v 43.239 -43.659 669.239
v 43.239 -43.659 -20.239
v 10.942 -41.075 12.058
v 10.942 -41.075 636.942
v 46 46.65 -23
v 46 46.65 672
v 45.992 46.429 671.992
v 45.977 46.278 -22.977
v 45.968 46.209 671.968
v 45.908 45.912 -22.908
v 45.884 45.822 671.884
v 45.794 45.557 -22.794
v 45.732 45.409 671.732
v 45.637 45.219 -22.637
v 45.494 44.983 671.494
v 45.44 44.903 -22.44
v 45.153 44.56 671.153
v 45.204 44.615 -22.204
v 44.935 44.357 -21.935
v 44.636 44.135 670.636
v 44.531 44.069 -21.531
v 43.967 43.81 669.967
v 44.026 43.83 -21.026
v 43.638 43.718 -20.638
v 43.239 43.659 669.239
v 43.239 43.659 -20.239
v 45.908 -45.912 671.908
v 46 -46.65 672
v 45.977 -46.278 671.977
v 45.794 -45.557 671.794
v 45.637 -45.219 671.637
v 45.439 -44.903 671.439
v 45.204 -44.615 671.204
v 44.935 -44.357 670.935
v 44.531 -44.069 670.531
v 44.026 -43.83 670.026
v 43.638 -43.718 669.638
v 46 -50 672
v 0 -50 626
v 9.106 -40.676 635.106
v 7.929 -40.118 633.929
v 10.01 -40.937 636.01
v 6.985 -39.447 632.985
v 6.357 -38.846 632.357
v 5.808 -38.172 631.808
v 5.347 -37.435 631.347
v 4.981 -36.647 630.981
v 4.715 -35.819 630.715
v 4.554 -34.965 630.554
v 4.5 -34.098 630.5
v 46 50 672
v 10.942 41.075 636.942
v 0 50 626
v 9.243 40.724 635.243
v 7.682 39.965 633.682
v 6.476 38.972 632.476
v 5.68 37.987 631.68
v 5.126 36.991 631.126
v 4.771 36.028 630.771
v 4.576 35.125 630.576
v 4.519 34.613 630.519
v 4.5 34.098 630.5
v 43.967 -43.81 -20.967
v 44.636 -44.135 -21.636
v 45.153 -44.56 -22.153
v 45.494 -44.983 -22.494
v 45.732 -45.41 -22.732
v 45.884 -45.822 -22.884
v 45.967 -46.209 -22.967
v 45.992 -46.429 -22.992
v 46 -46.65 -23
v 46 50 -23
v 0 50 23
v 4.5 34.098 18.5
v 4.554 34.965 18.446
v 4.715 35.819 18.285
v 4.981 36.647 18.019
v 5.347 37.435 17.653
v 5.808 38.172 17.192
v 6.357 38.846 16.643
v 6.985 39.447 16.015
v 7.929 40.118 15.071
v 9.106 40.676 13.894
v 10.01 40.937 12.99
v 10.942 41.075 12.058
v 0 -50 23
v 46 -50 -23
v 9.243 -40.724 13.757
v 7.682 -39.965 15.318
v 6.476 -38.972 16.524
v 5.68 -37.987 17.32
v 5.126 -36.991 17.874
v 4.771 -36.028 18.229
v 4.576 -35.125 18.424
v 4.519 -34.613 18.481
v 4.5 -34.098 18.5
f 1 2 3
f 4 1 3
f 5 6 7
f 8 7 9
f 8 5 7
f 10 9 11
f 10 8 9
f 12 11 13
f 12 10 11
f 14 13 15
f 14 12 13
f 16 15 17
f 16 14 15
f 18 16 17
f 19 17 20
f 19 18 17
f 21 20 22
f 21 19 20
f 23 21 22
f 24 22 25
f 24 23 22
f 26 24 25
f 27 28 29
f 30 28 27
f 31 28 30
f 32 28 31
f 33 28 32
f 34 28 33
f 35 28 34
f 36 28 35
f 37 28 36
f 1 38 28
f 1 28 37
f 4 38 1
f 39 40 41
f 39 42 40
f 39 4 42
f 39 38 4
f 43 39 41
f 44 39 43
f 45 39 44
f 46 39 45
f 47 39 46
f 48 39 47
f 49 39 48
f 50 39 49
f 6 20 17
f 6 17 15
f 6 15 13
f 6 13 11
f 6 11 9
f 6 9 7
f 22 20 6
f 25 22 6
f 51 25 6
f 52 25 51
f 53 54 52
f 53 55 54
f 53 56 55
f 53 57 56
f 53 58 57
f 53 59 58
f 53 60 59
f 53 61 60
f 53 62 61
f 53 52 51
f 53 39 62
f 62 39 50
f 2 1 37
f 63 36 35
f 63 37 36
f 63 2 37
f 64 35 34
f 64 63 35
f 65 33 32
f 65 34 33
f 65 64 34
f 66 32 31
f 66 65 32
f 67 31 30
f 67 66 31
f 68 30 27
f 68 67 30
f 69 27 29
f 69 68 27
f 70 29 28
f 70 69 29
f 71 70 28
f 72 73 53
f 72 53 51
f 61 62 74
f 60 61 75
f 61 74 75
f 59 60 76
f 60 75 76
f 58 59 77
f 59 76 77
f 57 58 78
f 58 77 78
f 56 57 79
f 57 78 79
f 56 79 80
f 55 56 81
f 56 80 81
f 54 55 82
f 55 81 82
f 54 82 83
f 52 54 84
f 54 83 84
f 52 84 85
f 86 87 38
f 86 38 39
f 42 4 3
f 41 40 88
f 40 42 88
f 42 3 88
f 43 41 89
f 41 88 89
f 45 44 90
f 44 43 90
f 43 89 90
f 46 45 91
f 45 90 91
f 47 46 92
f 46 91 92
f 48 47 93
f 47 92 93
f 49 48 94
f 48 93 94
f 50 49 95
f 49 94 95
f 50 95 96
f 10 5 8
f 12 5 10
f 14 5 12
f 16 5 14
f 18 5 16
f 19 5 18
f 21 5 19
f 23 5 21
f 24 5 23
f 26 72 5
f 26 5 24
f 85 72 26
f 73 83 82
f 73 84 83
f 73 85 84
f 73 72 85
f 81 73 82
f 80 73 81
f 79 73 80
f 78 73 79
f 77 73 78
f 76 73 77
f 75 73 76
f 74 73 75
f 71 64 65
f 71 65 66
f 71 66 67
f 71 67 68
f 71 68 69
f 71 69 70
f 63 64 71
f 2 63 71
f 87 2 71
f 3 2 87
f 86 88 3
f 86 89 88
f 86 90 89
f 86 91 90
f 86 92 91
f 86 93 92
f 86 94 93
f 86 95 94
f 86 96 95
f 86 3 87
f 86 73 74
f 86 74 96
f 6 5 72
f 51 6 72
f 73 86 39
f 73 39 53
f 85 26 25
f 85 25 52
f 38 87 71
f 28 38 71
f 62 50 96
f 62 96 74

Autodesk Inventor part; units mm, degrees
ref_plane "Начальная плоскость" through (0, 0, -23) normal (0, 0, 1) x (1, 0, 0)
ref_plane "Конечная плоскость" through (0, 0, 672) normal (0, 0, 1) x (1, 0, 0)
sketch "Эскиз" plane through (0, 0, 0) normal (0, 0, 1) x (1, 0, 0)
  line L0 (46, -50) -> (0, -50)
  line L1 (46, -50) -> (46, -46.6496)
  line L2 (43.2392, -43.6591) -> (10.9418, -41.0753)
  line L3 (4.5, -34.0976) -> (4.5, 34.0976)
  line L4 (43.2392, 43.6591) -> (10.9418, 41.0753)
  line L5 (46, 46.6496) -> (46, 50)
  line L6 (0, 50) -> (46, 50)
  line L7 (0, -50) -> (0, 50)
  arc A0 (4.5, -34.0976) -> (10.9418, -41.0753) centre (11.5, -34.0976) ccw
  arc A1 (10.9418, 41.0753) -> (4.5, 34.0976) centre (11.5, 34.0976) ccw
  arc A2 (46, -46.6496) -> (43.2392, -43.6591) centre (43, -46.6496) ccw
  arc A3 (43.2392, 43.6591) -> (46, 46.6496) centre (43, 46.6496) ccw
  line L8 (0, 70) -> (0, -70) construction
  line L9 (-9.3169, 0) -> (55.9016, 0) construction
  point P0 (46, -43.88)
  point P1 (4.5, -40.56)
  point P2 (4.5, 40.56)
  point P3 (46, 43.88)
  dimension "d3" = 46
  dimension "d5" = 4.5
  dimension "d7" = 100
  dimension "d9" = 9.44
  dimension "d11" = 9.44
  dimension "d13" = 6.12
  dimension "d15" = 6.12
  dimension "d22" = 7
  dimension "d23" = 3
  dimension "d24" = 50
  dimension "d25" = 0
extrude "Тело" add sketch "Эскиз" along normal up to surface (695 mm away) from surface at -23
sketch "Sketch3" plane through (0, 0, 0) normal (0, 0, 1) x (1, 0, 0)
  line L0 (0, 0) -> (10, 0)
ref_plane "Work Plane7" through (0, 0, 0) normal (0, -1, 0) x (1, 0, 0)
sketch "Sketch4" plane through (0, 0, 0) normal (0, -1, 0) x (1, 0, 0)
  line L0 (-2, -23) -> (12, -23)
  line L1 (-2, 672) -> (12, 672)
  dimension "d29" = 695
ref_plane "РабПлоскость8" through (46, 0, 672) normal (-0.7071, 0, 0.7071) x (0.7071, 0, 0.7071)
split "Разделение1" plane through (46, 0, 672) removes the side toward (-0.7071, 0, 0.7071)
ref_plane "РабПлоскость9" through (46, 0, -23) normal (-0.7071, 0, -0.7071) x (-0.7071, 0, 0.7071)
split "Разделение2" plane through (46, 0, -23) removes the side toward (-0.7071, 0, -0.7071)
equation "\"d3\" = b"
equation "\"d5\" = t1"
equation "\"d7\" = ParH"
equation "\"d9\" = msp_x1 + t2"
equation "\"d11\" = msp_x1 + t2"
equation "\"d13\" = -msp_x2 + t2"
equation "\"d15\" = -msp_x2 + t2"
equation "\"d22\" = R"
equation "\"d23\" = R1"
equation "\"d24\" = 0.5 * d7"
equation "\"d16\" = G_L"
equation "\"R1\" = 3"
equation "\"R\" = 7"
equation "\"t1\" = 4.5"
equation "\"t2\" = 7.6"
equation "\"ParH\" = 100"
equation "\"b\" = 46"
equation "\"msp_x1\" = 0.04 * b"
equation "\"msp_x2\" = -0.08 * t1 + 0.04 * b"
equation "\"G_L\" = d29"
equation "\"ex\" = 0"
equation "\"G_OFFSET_START\" = 23"
equation "\"G_OFFSET_END\" = 23"
equation "\"d26\" = -G_OFFSET_START"
equation "\"d27\" = G_OFFSET_END + B_L"
equation "\"B_L\" = 649"
properties part number "Швеллер 10U-695 ГОСТ 8240-97" material "Сталь, мягкая"
